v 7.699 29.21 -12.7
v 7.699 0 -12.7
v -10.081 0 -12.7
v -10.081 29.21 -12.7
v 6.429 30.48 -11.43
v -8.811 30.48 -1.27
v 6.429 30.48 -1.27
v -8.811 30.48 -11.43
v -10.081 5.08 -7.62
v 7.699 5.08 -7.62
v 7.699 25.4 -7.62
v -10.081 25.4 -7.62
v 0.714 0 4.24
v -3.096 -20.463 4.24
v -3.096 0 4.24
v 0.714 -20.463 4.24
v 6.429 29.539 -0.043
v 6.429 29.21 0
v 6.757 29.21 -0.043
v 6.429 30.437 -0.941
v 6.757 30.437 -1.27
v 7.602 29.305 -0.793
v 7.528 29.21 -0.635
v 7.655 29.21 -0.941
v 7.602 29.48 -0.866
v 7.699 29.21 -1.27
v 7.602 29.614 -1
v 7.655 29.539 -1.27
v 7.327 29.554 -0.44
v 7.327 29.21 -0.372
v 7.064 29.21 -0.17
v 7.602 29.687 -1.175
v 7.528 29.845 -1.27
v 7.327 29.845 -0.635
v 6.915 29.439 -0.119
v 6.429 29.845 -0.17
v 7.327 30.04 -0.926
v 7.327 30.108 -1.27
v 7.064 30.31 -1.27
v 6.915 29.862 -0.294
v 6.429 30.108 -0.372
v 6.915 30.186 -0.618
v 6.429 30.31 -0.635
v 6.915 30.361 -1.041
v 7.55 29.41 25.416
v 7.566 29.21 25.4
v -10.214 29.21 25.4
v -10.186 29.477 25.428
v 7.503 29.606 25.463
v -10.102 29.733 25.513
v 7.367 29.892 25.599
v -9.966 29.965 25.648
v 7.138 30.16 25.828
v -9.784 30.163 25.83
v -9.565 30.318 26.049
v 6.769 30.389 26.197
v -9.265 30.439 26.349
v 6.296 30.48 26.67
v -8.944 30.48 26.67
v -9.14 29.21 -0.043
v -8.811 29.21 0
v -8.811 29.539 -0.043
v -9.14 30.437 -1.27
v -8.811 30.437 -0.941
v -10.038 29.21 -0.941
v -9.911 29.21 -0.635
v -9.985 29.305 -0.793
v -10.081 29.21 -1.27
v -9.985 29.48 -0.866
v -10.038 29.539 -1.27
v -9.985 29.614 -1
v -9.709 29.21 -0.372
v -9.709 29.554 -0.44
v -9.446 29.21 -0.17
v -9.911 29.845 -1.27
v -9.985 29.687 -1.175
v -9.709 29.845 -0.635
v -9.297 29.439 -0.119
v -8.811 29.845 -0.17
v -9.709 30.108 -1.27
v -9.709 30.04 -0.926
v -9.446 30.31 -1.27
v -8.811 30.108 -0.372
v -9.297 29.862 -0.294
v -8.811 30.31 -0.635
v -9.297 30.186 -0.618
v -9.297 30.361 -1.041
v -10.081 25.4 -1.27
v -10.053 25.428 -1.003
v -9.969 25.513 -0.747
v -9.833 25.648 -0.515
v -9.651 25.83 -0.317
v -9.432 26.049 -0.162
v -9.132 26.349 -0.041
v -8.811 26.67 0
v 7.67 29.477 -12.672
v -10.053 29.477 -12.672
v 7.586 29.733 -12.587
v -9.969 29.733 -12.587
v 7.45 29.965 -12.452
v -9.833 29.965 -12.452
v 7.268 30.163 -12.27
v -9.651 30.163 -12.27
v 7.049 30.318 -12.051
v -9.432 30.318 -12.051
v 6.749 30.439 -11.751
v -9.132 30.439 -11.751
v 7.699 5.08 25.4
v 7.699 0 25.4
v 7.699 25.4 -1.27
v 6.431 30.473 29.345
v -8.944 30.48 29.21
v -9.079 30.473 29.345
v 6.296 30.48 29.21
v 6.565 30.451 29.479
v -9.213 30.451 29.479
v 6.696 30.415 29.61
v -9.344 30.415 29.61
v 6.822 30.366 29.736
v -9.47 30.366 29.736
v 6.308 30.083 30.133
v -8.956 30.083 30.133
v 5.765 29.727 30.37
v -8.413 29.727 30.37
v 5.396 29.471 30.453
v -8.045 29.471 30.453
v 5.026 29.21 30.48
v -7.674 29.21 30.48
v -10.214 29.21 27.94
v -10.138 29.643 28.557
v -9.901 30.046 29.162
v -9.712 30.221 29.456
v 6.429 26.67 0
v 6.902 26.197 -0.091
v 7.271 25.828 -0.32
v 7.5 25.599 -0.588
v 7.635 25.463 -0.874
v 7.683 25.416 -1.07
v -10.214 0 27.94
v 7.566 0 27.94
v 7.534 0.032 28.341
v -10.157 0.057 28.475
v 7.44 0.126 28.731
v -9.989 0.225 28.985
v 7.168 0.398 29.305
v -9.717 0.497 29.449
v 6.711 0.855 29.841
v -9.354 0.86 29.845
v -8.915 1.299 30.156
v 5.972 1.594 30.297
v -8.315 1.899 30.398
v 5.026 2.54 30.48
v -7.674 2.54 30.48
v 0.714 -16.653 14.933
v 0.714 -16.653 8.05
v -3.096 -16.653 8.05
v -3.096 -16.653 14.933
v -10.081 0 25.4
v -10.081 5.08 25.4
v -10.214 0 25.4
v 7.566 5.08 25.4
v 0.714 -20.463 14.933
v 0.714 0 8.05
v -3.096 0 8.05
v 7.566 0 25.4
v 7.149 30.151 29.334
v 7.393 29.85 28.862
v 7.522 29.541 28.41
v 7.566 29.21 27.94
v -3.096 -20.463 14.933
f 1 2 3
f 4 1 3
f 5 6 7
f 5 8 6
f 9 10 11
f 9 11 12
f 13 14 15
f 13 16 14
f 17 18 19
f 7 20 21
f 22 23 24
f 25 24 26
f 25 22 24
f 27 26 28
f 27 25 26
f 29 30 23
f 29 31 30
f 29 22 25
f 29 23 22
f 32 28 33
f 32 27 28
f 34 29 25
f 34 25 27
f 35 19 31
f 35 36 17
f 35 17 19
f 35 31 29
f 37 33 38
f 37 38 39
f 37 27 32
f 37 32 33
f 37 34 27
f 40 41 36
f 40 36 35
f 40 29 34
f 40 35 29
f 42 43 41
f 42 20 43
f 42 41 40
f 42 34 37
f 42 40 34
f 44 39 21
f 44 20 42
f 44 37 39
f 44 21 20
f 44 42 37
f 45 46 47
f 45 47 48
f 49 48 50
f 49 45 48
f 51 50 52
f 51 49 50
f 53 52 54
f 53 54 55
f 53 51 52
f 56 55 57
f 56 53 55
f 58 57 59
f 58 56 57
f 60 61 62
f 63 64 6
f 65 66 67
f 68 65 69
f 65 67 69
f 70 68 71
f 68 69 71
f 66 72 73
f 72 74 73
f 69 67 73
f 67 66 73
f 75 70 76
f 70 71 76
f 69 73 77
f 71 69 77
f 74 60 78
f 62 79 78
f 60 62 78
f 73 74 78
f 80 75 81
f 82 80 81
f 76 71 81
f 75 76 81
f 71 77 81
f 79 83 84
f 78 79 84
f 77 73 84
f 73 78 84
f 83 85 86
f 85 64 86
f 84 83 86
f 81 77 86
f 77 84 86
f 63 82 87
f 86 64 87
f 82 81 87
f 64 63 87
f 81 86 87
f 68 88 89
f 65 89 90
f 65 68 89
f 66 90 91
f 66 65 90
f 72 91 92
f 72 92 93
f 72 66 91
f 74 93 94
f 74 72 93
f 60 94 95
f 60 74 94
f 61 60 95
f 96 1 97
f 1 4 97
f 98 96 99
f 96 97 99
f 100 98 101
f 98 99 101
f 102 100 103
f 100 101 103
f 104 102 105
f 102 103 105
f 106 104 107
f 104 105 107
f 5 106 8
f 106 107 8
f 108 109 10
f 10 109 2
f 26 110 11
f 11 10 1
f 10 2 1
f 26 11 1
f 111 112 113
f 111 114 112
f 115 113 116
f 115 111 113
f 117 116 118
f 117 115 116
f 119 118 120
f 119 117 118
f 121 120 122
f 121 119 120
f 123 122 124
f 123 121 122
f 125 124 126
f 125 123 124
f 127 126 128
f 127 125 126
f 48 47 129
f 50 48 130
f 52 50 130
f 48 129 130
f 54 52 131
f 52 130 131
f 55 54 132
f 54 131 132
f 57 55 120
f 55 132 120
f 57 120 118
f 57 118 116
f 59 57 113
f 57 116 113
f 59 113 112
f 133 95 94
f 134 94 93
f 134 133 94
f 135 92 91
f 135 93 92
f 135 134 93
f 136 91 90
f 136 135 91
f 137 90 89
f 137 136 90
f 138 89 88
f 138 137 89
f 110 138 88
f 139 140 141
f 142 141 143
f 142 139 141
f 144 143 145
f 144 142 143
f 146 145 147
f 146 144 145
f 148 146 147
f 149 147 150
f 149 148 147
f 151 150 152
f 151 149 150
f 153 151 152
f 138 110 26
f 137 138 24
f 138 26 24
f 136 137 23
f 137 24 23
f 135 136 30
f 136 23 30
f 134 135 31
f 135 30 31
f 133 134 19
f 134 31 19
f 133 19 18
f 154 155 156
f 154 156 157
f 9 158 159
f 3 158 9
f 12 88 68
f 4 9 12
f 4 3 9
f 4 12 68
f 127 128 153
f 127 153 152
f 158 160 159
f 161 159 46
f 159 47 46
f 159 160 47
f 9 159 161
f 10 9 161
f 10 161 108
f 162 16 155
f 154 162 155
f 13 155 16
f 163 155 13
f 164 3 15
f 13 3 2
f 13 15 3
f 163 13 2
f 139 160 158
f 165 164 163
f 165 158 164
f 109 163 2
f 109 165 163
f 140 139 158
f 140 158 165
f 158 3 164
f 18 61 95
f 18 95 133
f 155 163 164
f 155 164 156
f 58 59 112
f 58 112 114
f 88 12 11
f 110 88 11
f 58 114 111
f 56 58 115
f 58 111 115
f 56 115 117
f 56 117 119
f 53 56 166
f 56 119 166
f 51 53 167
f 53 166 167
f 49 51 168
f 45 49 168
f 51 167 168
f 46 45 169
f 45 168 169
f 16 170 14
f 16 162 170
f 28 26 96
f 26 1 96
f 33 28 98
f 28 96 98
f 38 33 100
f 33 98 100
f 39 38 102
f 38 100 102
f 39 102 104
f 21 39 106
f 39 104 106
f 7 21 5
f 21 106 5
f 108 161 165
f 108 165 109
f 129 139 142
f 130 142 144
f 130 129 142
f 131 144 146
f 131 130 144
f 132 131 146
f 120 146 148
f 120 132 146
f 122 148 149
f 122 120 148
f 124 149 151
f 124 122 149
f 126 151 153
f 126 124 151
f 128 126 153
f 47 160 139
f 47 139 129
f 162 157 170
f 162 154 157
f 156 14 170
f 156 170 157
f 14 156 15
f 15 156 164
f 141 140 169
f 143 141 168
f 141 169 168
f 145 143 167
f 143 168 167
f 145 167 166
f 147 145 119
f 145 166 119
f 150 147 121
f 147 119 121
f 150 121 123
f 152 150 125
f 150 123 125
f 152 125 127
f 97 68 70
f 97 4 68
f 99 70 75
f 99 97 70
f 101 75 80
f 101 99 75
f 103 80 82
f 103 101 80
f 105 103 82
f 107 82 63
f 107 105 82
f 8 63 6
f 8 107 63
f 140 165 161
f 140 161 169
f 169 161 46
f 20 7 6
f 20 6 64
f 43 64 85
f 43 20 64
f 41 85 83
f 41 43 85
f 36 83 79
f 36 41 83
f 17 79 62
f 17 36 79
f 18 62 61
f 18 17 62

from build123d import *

# Parameters (mm, degrees)
F1_W         = 17.78
F1_H         = 30.48
F2_DEPTH     = 5.08
F3_W         = 17.78
F3_H         = 5.08
F4_DEPTH     = 38.1
F6_W         = 17.78
F6_H         = 5.08
F7_DEPTH     = 25.4
F9_W         = 17.78
F9_H         = 5.08
F10_DEPTH    = 7.62
F11_R        = 1.27
F12_R        = 1.27
F13_T1_DEPTH = 41.91
F13_T3_DEPTH = 30.48
F16_DEPTH    = 1.905


# Not quite as in the source:
# - a fillet or chamfer that OpenCascade refuses, or shapes differently, is made with other operations: its cross-section is extruded or revolved along the edge and cut away or added


with BuildPart() as f2:
    # F1 (on offset) → F2 (new body)
    with BuildSketch(Plane.XY.offset(25.4)):
        with Locations((-1.3240431021, 15.24)):
            Rectangle(F1_W, F1_H)
    extrude(amount=F2_DEPTH)

    # F3 (on offset) → F4 (join)
    with BuildSketch(Plane.XY.offset(25.4)):
        with Locations((-1.1914440245, 2.54)):
            Rectangle(F3_W, F3_H)
    extrude(amount=-F4_DEPTH)

    # F6 (on offset) → F7 (join)
    with BuildSketch(Plane(origin=(0, 5.08, 0), x_dir=(-1, 0, 0), z_dir=(0, 1, 0))):
        with Locations((1.1914440245, -10.16)):
            Rectangle(F6_W, F6_H)
    extrude(amount=F7_DEPTH)

    # F9 (on offset) → F10 (join)
    with BuildSketch(Plane.XY.offset(-7.62)):
        with Locations((-1.1914440245, 27.94)):
            Rectangle(F9_W, F9_H)
    extrude(amount=F10_DEPTH)

    # F11
    f11_edges = [f2.edges().sort_by_distance(p)[0] for p in [
        (-1.191444, 30.48, 0),
        (-10.081444, 27.94, 0),
        (-1.191444, 25.4, 0),
        (7.698556, 27.94, 0),
        (-1.191444, 30.48, -12.7),
        (-10.081444, 30.48, -6.35),
        (7.698556, 30.48, -6.35),
    ]]
    fillet(f11_edges, radius=F11_R)

    # F12
    f12_edges = [f2.edges().sort_by_distance(p)[0] for p in [
        (7.565957, 30.48, 27.94),
        (-10.214043, 30.48, 27.94),
        (-1.324043, 30.48, 25.4),
        (-1.324043, 30.48, 30.48),
    ]]
    fillet(f12_edges, radius=F12_R)

    # F13: fillet of radius 2.54 on 4 edges, made by hand

    # F13_s2 → F13_t1 (cut)
    with BuildSketch(Plane.XZ.offset(-35.56)):
        with BuildLine():
            ThreePointArc((-10.2140431021, 27.94), (-9.4700943263, 29.7360512242), (-7.6740431021, 30.48))
            Line((-7.6740431021, 30.48), (-10.2140431021, 30.48))
            Line((-10.2140431021, 30.48), (-10.2140431021, 27.94))
        make_face()
        with BuildLine():
            ThreePointArc((7.5659568979, 27.94), (6.8220081221, 29.7360512242), (5.0259568979, 30.48))
            Line((5.0259568979, 30.48), (7.5659568979, 30.48))
            Line((7.5659568979, 30.48), (7.5659568979, 27.94))
        make_face()
    extrude(amount=F13_T1_DEPTH, mode=Mode.SUBTRACT)

    # F13_s4 → F13_t3 (cut)
    with BuildSketch(Plane.YZ.offset(-16.5640431021)):
        with BuildLine():
            ThreePointArc((0, 27.94), (0.7439487758, 29.7360512242), (2.54, 30.48))
            Line((2.54, 30.48), (0, 30.48))
            Line((0, 30.48), (0, 27.94))
        make_face()
    extrude(amount=F13_T3_DEPTH, mode=Mode.SUBTRACT)

    # F15 (on offset) → F16 (join, symmetric)
    with BuildSketch(Plane.YZ.offset(-1.1914440245)):
        Polygon((-20.4633865505, 4.2401612736), (0, 4.2401612736), (0, 8.0501612736), (-16.6533865505, 8.0501612736), (-16.6533865505, 14.932741411), (-20.4633865505, 14.932741411), align=None)
    extrude(amount=F16_DEPTH, both=True)


solid = f2.part
